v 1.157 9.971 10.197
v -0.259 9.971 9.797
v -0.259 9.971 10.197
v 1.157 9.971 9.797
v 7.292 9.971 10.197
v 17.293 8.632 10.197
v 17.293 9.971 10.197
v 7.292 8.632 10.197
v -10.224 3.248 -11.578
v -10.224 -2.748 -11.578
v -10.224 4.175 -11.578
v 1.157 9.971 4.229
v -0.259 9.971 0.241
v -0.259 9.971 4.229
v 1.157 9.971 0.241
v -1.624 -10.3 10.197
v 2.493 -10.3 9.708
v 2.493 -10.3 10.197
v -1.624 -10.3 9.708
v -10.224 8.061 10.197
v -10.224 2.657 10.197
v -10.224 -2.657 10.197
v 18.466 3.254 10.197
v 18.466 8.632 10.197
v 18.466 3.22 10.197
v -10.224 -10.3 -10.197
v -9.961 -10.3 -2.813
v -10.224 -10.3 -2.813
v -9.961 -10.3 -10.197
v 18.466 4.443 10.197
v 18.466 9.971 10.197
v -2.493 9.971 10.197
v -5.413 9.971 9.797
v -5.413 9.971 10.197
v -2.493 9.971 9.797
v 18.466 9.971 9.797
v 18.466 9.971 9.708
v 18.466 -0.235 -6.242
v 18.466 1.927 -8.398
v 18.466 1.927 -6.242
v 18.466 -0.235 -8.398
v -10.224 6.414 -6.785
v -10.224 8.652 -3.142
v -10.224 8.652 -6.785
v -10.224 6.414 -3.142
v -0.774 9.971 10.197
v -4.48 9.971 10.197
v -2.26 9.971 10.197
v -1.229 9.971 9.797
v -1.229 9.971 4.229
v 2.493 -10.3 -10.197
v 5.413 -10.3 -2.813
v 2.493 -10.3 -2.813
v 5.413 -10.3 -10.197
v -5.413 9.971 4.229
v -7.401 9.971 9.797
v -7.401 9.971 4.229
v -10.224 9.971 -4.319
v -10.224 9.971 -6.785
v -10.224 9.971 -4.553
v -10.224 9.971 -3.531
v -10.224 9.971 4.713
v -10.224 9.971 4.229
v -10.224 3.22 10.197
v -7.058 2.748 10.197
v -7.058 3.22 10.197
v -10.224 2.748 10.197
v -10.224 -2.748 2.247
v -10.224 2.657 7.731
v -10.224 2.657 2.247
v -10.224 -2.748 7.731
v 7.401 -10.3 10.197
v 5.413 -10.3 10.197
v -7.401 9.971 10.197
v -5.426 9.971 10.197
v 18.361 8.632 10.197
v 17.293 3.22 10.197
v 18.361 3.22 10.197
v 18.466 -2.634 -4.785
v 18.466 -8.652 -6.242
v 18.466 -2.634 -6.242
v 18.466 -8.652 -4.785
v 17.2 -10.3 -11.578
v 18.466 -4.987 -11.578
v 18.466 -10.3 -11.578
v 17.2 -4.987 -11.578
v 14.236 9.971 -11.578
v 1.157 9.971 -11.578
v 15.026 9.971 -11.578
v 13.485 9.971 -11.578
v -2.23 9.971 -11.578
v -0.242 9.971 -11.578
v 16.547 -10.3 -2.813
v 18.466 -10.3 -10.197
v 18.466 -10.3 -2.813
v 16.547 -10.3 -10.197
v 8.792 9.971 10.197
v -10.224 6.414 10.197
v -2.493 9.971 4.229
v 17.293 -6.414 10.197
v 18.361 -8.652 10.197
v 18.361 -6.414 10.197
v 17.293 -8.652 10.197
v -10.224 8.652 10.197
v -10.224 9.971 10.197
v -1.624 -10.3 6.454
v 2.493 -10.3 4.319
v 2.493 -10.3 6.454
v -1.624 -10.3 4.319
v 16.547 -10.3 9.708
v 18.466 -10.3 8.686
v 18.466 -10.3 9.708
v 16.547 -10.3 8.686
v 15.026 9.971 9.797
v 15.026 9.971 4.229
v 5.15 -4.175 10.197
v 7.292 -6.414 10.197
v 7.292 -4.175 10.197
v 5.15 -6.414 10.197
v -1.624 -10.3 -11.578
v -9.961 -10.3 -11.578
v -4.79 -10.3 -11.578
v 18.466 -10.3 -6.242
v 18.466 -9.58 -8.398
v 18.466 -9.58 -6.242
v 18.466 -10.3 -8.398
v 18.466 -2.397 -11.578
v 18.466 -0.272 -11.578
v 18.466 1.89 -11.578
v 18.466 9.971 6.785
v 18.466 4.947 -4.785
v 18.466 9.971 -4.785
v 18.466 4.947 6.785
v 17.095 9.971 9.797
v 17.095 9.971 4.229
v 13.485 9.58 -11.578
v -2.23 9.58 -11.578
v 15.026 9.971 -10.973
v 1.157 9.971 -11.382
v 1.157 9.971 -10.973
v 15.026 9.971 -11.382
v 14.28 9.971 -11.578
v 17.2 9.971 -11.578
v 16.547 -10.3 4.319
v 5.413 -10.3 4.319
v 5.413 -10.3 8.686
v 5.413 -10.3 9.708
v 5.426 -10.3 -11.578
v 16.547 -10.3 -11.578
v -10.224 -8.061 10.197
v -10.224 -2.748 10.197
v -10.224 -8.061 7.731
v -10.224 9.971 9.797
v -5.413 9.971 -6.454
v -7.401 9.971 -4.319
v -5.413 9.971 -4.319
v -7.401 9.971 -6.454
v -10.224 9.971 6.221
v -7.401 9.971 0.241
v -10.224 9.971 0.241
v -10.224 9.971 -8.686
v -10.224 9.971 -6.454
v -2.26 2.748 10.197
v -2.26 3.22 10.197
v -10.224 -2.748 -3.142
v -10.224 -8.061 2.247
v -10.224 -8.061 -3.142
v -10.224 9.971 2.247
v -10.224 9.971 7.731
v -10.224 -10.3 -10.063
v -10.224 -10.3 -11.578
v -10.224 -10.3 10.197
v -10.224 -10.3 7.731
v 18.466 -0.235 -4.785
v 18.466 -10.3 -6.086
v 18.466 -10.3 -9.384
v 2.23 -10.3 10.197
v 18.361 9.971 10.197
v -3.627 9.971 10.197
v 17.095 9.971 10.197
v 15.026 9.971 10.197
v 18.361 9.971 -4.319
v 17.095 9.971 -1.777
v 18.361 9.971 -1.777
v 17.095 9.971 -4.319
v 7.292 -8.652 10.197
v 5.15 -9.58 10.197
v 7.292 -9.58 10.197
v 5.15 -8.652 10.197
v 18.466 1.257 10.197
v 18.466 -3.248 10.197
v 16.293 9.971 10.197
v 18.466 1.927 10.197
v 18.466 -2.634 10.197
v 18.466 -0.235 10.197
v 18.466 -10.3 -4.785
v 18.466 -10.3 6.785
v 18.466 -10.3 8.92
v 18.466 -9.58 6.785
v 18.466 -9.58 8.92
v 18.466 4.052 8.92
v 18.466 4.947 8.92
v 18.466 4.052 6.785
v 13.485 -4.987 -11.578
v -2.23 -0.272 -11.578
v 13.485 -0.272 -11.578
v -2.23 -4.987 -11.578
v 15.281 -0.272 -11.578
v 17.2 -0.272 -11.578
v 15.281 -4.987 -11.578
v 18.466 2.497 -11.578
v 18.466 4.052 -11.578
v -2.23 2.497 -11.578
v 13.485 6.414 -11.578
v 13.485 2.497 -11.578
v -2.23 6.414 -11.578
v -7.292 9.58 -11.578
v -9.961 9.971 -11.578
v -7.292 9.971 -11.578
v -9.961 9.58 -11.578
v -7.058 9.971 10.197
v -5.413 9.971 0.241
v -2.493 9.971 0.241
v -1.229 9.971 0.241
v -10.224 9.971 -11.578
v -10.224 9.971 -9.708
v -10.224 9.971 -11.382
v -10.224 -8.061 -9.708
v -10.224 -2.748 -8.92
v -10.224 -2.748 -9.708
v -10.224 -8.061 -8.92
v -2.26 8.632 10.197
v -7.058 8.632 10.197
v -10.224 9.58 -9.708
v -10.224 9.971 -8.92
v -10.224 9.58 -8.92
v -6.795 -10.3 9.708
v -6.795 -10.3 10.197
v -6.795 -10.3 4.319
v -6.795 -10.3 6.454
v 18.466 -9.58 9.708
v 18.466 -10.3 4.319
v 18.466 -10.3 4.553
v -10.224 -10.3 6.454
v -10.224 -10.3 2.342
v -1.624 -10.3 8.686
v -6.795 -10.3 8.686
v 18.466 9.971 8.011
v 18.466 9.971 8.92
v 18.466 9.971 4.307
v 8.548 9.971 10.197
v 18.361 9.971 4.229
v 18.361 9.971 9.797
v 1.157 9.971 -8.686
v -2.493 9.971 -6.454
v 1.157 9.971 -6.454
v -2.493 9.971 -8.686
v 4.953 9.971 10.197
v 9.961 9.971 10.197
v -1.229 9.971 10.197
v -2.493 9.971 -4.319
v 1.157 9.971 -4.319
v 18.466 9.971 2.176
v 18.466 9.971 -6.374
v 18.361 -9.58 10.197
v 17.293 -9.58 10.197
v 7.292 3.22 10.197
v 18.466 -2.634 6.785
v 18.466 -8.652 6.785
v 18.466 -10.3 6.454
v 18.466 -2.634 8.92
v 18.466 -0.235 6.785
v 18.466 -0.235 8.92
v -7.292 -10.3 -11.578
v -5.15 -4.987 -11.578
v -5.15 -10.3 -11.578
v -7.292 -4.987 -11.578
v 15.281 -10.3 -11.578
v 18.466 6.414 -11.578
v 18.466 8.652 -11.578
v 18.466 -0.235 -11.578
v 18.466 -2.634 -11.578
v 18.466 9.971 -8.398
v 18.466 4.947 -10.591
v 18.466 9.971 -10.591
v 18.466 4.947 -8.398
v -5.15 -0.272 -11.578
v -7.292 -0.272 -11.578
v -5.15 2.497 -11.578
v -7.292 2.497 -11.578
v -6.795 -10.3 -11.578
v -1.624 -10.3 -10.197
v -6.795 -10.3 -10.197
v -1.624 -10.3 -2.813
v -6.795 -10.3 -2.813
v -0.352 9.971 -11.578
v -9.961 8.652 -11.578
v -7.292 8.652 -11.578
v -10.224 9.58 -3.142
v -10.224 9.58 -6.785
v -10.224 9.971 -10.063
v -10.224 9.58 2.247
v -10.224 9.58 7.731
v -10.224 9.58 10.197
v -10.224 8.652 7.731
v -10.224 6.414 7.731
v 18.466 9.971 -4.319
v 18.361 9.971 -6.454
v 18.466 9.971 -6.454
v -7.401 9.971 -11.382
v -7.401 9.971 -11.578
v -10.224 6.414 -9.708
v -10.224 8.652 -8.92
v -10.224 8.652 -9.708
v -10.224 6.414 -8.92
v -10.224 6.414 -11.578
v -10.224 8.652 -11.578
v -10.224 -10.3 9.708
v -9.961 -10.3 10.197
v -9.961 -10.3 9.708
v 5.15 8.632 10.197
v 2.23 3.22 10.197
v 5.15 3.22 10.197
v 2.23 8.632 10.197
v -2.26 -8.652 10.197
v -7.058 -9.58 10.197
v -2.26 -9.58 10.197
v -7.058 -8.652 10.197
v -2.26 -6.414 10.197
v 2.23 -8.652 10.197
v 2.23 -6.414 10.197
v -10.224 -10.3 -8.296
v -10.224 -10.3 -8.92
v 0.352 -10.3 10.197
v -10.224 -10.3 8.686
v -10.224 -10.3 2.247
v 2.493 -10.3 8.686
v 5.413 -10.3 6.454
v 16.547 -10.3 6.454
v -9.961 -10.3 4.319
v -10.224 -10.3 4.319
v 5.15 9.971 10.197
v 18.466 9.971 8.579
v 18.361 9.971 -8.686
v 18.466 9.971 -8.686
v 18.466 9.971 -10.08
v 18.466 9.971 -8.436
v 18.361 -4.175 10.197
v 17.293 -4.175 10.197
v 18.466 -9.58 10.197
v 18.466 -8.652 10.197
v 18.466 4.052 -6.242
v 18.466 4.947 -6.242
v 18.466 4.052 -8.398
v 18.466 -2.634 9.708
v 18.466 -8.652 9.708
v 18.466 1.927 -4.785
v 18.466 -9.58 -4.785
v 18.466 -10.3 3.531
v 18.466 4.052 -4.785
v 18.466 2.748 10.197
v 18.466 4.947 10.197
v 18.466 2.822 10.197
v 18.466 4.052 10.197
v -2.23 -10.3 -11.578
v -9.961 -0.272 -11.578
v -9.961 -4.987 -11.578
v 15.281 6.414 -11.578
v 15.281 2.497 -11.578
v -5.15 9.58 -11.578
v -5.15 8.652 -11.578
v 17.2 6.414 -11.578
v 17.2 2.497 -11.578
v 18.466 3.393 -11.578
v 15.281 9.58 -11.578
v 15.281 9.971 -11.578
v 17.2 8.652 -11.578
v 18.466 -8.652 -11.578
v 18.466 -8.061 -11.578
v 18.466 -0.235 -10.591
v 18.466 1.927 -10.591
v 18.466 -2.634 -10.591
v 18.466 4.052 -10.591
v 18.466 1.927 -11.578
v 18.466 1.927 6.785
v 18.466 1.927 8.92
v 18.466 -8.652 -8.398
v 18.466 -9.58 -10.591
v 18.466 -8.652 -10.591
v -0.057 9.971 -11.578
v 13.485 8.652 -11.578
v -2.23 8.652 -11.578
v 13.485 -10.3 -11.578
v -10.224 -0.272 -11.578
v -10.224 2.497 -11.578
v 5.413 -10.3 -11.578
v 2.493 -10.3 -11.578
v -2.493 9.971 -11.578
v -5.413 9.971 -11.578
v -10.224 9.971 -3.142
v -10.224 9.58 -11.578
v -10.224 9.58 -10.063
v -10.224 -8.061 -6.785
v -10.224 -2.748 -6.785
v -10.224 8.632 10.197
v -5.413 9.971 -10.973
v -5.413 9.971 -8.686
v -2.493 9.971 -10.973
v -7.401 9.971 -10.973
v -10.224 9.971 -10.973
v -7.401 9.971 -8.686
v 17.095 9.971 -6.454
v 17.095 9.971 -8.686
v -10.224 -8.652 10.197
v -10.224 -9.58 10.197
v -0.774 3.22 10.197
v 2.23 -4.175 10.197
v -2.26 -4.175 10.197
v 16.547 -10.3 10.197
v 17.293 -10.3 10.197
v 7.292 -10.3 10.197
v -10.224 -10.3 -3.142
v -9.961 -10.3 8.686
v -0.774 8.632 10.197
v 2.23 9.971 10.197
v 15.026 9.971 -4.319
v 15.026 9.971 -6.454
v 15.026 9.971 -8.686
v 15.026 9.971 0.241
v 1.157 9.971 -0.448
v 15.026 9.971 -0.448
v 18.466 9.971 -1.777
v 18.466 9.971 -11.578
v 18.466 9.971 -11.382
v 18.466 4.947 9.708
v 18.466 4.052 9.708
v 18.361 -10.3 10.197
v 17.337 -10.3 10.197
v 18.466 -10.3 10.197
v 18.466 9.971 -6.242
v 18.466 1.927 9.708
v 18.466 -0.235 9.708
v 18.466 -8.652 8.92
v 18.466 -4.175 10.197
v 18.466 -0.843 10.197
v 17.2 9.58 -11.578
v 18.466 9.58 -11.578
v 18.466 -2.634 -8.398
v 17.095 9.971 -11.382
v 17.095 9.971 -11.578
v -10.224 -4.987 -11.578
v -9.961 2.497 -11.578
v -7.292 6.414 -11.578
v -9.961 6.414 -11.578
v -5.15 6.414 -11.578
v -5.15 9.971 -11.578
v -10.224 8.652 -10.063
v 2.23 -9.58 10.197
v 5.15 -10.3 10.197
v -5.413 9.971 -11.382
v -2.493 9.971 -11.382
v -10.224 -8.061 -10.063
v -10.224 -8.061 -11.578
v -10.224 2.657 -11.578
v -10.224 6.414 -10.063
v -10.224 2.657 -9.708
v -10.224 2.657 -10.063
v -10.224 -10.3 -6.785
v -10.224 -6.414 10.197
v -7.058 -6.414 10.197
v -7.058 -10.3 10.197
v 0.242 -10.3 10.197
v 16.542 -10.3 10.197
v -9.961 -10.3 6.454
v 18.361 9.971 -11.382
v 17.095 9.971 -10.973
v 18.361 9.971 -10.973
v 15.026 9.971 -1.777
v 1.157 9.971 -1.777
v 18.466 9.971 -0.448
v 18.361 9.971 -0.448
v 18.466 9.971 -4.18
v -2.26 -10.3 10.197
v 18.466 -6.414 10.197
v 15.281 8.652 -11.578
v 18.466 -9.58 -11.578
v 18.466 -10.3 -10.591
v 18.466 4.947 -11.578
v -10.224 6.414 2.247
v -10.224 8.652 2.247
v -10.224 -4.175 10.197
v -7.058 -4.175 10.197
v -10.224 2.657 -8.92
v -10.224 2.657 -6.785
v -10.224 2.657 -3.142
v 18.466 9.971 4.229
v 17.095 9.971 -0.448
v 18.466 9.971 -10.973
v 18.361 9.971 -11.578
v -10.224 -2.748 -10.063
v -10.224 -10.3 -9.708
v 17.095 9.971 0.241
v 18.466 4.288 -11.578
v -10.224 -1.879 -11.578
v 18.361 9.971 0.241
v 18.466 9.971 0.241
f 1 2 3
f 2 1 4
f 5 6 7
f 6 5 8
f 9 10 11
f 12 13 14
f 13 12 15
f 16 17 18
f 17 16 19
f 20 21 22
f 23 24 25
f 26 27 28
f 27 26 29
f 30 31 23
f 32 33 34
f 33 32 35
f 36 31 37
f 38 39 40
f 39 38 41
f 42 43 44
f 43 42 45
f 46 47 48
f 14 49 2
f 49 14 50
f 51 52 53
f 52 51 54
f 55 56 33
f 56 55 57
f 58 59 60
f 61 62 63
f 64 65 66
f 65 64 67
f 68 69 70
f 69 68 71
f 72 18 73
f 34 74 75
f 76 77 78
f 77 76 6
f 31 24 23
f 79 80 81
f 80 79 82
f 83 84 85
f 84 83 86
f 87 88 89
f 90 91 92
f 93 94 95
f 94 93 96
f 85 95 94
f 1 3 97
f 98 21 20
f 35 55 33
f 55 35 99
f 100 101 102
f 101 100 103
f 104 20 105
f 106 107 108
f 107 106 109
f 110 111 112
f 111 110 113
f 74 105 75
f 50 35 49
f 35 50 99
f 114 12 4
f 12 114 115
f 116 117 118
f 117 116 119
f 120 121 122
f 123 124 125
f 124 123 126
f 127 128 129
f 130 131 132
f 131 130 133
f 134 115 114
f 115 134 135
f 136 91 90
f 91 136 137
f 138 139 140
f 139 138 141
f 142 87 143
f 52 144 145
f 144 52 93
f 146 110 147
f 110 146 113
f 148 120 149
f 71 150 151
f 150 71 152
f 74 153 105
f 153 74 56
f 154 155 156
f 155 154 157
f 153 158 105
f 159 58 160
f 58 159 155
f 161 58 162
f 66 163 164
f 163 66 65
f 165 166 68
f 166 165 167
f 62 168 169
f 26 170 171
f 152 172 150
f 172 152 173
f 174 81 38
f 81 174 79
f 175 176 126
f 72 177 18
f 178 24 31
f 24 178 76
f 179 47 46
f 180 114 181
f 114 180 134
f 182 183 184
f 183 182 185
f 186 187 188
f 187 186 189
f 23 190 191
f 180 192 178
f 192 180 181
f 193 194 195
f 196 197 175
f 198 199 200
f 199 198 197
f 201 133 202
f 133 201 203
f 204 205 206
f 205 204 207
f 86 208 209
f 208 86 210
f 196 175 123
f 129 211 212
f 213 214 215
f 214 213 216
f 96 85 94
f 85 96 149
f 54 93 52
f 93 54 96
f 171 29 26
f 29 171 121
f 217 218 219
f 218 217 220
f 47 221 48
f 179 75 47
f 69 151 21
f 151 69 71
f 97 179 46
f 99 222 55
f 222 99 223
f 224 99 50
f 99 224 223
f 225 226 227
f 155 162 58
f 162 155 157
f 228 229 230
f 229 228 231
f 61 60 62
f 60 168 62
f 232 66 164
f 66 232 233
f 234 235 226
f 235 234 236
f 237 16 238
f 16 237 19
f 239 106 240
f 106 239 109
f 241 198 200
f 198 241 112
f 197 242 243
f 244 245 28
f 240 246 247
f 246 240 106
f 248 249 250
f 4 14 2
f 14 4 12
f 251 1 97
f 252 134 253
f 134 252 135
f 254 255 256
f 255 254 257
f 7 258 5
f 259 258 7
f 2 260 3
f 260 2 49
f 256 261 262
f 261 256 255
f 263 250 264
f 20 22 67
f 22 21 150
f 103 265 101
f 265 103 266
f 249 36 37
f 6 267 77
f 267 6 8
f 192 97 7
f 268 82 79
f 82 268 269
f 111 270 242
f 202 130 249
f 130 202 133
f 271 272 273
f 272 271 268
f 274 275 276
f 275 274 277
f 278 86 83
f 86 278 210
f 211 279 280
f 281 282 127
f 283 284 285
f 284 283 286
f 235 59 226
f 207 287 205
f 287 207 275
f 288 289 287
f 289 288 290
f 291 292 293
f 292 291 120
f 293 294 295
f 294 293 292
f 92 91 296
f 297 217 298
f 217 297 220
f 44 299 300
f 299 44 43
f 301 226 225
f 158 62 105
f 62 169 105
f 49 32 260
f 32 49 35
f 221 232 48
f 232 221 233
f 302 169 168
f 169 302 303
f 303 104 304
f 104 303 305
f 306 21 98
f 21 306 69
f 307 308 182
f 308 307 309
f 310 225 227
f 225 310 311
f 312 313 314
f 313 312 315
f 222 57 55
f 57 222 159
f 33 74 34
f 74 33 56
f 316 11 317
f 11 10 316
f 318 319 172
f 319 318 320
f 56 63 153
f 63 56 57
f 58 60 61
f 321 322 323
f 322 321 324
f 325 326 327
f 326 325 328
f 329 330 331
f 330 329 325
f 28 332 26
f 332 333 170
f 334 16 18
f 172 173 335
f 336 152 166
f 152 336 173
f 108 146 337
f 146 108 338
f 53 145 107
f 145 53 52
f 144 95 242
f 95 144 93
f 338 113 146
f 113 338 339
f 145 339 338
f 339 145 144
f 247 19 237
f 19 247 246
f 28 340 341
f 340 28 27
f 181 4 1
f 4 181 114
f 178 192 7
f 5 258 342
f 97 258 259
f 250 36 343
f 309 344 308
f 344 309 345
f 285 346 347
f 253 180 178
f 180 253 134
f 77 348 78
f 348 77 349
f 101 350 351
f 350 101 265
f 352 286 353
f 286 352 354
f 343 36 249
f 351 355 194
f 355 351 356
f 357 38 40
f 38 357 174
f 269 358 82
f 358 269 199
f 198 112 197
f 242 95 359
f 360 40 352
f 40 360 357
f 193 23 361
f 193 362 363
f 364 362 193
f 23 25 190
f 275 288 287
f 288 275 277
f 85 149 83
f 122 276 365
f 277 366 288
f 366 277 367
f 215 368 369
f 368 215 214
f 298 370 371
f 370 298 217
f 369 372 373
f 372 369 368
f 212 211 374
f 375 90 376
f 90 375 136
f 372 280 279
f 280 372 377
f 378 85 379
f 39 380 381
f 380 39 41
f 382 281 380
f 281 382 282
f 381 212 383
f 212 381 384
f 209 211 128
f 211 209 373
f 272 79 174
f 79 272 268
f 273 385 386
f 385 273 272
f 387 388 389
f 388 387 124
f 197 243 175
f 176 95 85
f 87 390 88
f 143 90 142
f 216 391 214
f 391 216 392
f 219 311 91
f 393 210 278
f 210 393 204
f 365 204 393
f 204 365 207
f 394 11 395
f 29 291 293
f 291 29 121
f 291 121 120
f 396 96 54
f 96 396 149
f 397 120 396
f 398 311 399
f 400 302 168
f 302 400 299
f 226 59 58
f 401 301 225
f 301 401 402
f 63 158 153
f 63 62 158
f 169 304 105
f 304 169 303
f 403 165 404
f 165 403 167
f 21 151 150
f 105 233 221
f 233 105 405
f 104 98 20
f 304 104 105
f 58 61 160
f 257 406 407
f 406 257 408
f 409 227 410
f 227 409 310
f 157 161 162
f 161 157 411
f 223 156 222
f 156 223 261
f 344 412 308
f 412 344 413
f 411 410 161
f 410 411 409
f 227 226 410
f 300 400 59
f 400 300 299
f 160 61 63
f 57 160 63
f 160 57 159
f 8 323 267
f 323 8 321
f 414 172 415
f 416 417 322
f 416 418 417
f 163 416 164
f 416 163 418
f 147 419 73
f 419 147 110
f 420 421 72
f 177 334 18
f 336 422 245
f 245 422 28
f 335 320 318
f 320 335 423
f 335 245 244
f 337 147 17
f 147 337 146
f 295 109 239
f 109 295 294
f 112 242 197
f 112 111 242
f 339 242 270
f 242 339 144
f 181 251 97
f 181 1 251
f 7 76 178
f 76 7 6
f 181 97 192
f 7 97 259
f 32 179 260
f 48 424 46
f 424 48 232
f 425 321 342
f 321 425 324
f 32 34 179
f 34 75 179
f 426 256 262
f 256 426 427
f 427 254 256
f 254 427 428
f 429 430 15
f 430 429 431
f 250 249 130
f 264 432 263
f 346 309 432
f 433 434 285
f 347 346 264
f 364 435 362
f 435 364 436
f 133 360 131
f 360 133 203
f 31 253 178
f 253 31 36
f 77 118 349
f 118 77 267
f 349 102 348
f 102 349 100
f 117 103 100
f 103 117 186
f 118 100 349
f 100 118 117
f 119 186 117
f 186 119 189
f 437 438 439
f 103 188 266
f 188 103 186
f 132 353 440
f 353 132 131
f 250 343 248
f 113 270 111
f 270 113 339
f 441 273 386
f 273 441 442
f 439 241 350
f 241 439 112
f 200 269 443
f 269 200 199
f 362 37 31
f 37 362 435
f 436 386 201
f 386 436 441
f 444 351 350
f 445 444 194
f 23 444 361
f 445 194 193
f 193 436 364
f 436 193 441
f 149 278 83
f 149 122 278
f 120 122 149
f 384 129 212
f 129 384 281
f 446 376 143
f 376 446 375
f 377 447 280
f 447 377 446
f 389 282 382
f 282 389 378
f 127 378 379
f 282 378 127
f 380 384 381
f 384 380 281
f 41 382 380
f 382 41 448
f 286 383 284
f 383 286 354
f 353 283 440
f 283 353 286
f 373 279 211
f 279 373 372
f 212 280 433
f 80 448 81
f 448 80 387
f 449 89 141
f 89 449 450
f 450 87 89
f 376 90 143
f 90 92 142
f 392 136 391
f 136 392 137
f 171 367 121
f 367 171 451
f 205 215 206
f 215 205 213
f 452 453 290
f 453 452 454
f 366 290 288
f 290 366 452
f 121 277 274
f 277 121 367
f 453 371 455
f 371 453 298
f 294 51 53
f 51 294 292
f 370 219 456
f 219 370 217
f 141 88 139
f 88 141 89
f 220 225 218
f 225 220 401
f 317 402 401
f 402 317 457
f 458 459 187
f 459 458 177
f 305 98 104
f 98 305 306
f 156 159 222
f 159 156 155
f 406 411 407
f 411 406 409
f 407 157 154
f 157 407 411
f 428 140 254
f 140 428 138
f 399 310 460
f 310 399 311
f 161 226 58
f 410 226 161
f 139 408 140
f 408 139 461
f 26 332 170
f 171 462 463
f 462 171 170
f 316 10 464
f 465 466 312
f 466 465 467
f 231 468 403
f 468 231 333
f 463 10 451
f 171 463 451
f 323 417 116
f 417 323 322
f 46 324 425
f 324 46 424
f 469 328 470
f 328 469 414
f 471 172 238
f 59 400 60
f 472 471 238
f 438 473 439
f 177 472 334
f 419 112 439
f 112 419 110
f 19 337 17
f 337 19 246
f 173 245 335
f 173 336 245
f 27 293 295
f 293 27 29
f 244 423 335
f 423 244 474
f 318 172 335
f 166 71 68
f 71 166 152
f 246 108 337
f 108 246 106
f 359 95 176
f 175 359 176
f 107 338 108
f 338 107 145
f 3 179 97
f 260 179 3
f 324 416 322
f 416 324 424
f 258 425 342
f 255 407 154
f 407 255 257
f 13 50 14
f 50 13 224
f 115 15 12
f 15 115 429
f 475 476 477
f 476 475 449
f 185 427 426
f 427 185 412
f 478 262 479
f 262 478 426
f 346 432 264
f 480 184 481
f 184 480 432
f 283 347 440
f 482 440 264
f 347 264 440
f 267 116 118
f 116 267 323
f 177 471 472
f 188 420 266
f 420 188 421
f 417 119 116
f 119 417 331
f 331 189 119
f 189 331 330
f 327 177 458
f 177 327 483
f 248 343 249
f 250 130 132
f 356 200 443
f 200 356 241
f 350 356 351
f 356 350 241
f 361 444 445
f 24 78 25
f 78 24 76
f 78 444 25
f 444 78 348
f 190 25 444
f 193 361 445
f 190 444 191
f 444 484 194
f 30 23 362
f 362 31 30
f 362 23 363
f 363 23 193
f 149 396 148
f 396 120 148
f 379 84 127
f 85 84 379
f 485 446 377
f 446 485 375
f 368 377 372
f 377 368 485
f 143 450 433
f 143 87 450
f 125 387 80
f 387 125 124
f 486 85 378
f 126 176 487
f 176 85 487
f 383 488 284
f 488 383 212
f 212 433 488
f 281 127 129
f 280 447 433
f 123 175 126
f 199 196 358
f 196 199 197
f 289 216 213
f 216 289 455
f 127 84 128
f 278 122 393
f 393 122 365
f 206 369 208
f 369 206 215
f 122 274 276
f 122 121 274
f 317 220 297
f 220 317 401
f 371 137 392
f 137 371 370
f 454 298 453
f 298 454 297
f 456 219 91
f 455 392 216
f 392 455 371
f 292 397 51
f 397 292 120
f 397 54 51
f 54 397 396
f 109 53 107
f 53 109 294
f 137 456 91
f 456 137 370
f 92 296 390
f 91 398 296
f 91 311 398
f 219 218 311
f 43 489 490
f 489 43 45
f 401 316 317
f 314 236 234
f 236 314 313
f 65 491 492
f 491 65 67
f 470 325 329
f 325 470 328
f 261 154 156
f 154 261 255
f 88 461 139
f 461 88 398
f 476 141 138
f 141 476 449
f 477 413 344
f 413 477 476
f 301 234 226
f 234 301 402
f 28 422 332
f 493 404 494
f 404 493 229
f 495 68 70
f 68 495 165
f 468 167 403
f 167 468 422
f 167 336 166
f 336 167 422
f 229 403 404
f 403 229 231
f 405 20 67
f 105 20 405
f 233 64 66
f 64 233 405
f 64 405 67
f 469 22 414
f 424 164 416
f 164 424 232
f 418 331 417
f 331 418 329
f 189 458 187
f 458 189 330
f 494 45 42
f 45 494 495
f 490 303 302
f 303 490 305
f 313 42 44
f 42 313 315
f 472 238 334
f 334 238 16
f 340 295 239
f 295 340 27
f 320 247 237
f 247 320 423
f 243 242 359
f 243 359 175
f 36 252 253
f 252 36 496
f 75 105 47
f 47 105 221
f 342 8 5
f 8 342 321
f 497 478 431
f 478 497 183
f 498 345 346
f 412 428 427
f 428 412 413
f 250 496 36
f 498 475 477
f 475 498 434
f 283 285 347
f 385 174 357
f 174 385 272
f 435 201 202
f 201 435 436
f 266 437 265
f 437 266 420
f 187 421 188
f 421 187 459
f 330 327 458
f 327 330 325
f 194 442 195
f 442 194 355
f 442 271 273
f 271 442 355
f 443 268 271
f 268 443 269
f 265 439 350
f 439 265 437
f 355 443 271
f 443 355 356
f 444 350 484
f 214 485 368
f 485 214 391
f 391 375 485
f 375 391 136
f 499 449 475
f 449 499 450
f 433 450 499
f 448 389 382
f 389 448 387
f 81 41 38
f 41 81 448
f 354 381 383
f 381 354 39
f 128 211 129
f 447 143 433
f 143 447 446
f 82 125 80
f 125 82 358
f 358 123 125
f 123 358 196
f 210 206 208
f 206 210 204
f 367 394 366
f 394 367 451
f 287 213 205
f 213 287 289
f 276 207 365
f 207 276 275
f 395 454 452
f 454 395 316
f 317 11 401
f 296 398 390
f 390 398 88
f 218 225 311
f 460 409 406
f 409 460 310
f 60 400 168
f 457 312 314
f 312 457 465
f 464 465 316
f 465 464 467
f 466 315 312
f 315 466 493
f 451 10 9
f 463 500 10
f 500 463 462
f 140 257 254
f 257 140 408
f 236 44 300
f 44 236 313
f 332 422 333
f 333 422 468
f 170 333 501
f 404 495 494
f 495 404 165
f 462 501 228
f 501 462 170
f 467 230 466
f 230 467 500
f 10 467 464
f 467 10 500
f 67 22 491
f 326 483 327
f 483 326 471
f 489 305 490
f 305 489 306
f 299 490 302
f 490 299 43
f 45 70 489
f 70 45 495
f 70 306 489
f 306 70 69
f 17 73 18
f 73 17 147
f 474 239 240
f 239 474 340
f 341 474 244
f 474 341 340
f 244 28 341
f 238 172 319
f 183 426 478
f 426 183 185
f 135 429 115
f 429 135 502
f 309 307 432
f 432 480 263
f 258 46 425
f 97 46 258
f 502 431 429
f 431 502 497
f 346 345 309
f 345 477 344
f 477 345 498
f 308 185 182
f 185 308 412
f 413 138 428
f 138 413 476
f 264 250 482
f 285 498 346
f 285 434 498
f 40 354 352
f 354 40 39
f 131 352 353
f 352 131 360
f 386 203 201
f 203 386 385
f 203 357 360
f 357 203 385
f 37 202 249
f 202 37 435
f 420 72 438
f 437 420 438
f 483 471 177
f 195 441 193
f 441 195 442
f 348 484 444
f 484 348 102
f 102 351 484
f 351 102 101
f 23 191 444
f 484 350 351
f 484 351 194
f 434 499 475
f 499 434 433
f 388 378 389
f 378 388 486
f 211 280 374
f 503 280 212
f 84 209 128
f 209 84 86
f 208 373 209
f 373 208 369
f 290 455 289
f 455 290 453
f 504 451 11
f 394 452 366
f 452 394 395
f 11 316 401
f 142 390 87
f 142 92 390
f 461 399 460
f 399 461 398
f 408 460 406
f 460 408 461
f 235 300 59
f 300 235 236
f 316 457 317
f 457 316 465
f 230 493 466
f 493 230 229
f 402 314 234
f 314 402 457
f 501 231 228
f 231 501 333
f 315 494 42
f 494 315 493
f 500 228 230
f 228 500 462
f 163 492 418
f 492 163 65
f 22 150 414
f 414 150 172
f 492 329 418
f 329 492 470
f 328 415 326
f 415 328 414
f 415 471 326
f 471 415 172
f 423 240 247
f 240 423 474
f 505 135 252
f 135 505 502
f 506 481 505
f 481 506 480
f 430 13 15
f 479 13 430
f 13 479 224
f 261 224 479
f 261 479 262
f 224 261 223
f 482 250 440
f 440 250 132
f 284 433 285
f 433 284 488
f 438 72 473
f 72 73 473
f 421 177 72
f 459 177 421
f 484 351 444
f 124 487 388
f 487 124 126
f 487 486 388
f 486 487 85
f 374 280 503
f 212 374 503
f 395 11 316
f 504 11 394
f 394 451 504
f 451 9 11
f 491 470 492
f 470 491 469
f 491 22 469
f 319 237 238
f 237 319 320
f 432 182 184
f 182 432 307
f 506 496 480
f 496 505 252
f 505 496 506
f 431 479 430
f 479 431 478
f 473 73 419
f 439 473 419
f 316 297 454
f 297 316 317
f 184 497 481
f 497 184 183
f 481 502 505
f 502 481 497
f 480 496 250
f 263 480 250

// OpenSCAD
obj();
 # bbox() obj();
 module obj(){
      rotate([40,30,0]) translate([15,1,0])    sphere(4);

 rotate([40,30,0]) difference(){
     
     sphere(10);
 translate([0,8,0])   rotate([40,30,0])  sphere(7);
 rotate([40,30,0]) translate([5,1,0])    sphere(8);
 }
 }


module bbox(s=1.08)
 
{$fn=8;
    minkowski(){
    
minkowski(){
hull(){  scale([0.000001,s,0.000001]) children();}
hull(){    scale([s,0.000001,0.000001])  children();}
}
hull(){ scale([0.000001,0.000001,s] )     children();}
}
}
